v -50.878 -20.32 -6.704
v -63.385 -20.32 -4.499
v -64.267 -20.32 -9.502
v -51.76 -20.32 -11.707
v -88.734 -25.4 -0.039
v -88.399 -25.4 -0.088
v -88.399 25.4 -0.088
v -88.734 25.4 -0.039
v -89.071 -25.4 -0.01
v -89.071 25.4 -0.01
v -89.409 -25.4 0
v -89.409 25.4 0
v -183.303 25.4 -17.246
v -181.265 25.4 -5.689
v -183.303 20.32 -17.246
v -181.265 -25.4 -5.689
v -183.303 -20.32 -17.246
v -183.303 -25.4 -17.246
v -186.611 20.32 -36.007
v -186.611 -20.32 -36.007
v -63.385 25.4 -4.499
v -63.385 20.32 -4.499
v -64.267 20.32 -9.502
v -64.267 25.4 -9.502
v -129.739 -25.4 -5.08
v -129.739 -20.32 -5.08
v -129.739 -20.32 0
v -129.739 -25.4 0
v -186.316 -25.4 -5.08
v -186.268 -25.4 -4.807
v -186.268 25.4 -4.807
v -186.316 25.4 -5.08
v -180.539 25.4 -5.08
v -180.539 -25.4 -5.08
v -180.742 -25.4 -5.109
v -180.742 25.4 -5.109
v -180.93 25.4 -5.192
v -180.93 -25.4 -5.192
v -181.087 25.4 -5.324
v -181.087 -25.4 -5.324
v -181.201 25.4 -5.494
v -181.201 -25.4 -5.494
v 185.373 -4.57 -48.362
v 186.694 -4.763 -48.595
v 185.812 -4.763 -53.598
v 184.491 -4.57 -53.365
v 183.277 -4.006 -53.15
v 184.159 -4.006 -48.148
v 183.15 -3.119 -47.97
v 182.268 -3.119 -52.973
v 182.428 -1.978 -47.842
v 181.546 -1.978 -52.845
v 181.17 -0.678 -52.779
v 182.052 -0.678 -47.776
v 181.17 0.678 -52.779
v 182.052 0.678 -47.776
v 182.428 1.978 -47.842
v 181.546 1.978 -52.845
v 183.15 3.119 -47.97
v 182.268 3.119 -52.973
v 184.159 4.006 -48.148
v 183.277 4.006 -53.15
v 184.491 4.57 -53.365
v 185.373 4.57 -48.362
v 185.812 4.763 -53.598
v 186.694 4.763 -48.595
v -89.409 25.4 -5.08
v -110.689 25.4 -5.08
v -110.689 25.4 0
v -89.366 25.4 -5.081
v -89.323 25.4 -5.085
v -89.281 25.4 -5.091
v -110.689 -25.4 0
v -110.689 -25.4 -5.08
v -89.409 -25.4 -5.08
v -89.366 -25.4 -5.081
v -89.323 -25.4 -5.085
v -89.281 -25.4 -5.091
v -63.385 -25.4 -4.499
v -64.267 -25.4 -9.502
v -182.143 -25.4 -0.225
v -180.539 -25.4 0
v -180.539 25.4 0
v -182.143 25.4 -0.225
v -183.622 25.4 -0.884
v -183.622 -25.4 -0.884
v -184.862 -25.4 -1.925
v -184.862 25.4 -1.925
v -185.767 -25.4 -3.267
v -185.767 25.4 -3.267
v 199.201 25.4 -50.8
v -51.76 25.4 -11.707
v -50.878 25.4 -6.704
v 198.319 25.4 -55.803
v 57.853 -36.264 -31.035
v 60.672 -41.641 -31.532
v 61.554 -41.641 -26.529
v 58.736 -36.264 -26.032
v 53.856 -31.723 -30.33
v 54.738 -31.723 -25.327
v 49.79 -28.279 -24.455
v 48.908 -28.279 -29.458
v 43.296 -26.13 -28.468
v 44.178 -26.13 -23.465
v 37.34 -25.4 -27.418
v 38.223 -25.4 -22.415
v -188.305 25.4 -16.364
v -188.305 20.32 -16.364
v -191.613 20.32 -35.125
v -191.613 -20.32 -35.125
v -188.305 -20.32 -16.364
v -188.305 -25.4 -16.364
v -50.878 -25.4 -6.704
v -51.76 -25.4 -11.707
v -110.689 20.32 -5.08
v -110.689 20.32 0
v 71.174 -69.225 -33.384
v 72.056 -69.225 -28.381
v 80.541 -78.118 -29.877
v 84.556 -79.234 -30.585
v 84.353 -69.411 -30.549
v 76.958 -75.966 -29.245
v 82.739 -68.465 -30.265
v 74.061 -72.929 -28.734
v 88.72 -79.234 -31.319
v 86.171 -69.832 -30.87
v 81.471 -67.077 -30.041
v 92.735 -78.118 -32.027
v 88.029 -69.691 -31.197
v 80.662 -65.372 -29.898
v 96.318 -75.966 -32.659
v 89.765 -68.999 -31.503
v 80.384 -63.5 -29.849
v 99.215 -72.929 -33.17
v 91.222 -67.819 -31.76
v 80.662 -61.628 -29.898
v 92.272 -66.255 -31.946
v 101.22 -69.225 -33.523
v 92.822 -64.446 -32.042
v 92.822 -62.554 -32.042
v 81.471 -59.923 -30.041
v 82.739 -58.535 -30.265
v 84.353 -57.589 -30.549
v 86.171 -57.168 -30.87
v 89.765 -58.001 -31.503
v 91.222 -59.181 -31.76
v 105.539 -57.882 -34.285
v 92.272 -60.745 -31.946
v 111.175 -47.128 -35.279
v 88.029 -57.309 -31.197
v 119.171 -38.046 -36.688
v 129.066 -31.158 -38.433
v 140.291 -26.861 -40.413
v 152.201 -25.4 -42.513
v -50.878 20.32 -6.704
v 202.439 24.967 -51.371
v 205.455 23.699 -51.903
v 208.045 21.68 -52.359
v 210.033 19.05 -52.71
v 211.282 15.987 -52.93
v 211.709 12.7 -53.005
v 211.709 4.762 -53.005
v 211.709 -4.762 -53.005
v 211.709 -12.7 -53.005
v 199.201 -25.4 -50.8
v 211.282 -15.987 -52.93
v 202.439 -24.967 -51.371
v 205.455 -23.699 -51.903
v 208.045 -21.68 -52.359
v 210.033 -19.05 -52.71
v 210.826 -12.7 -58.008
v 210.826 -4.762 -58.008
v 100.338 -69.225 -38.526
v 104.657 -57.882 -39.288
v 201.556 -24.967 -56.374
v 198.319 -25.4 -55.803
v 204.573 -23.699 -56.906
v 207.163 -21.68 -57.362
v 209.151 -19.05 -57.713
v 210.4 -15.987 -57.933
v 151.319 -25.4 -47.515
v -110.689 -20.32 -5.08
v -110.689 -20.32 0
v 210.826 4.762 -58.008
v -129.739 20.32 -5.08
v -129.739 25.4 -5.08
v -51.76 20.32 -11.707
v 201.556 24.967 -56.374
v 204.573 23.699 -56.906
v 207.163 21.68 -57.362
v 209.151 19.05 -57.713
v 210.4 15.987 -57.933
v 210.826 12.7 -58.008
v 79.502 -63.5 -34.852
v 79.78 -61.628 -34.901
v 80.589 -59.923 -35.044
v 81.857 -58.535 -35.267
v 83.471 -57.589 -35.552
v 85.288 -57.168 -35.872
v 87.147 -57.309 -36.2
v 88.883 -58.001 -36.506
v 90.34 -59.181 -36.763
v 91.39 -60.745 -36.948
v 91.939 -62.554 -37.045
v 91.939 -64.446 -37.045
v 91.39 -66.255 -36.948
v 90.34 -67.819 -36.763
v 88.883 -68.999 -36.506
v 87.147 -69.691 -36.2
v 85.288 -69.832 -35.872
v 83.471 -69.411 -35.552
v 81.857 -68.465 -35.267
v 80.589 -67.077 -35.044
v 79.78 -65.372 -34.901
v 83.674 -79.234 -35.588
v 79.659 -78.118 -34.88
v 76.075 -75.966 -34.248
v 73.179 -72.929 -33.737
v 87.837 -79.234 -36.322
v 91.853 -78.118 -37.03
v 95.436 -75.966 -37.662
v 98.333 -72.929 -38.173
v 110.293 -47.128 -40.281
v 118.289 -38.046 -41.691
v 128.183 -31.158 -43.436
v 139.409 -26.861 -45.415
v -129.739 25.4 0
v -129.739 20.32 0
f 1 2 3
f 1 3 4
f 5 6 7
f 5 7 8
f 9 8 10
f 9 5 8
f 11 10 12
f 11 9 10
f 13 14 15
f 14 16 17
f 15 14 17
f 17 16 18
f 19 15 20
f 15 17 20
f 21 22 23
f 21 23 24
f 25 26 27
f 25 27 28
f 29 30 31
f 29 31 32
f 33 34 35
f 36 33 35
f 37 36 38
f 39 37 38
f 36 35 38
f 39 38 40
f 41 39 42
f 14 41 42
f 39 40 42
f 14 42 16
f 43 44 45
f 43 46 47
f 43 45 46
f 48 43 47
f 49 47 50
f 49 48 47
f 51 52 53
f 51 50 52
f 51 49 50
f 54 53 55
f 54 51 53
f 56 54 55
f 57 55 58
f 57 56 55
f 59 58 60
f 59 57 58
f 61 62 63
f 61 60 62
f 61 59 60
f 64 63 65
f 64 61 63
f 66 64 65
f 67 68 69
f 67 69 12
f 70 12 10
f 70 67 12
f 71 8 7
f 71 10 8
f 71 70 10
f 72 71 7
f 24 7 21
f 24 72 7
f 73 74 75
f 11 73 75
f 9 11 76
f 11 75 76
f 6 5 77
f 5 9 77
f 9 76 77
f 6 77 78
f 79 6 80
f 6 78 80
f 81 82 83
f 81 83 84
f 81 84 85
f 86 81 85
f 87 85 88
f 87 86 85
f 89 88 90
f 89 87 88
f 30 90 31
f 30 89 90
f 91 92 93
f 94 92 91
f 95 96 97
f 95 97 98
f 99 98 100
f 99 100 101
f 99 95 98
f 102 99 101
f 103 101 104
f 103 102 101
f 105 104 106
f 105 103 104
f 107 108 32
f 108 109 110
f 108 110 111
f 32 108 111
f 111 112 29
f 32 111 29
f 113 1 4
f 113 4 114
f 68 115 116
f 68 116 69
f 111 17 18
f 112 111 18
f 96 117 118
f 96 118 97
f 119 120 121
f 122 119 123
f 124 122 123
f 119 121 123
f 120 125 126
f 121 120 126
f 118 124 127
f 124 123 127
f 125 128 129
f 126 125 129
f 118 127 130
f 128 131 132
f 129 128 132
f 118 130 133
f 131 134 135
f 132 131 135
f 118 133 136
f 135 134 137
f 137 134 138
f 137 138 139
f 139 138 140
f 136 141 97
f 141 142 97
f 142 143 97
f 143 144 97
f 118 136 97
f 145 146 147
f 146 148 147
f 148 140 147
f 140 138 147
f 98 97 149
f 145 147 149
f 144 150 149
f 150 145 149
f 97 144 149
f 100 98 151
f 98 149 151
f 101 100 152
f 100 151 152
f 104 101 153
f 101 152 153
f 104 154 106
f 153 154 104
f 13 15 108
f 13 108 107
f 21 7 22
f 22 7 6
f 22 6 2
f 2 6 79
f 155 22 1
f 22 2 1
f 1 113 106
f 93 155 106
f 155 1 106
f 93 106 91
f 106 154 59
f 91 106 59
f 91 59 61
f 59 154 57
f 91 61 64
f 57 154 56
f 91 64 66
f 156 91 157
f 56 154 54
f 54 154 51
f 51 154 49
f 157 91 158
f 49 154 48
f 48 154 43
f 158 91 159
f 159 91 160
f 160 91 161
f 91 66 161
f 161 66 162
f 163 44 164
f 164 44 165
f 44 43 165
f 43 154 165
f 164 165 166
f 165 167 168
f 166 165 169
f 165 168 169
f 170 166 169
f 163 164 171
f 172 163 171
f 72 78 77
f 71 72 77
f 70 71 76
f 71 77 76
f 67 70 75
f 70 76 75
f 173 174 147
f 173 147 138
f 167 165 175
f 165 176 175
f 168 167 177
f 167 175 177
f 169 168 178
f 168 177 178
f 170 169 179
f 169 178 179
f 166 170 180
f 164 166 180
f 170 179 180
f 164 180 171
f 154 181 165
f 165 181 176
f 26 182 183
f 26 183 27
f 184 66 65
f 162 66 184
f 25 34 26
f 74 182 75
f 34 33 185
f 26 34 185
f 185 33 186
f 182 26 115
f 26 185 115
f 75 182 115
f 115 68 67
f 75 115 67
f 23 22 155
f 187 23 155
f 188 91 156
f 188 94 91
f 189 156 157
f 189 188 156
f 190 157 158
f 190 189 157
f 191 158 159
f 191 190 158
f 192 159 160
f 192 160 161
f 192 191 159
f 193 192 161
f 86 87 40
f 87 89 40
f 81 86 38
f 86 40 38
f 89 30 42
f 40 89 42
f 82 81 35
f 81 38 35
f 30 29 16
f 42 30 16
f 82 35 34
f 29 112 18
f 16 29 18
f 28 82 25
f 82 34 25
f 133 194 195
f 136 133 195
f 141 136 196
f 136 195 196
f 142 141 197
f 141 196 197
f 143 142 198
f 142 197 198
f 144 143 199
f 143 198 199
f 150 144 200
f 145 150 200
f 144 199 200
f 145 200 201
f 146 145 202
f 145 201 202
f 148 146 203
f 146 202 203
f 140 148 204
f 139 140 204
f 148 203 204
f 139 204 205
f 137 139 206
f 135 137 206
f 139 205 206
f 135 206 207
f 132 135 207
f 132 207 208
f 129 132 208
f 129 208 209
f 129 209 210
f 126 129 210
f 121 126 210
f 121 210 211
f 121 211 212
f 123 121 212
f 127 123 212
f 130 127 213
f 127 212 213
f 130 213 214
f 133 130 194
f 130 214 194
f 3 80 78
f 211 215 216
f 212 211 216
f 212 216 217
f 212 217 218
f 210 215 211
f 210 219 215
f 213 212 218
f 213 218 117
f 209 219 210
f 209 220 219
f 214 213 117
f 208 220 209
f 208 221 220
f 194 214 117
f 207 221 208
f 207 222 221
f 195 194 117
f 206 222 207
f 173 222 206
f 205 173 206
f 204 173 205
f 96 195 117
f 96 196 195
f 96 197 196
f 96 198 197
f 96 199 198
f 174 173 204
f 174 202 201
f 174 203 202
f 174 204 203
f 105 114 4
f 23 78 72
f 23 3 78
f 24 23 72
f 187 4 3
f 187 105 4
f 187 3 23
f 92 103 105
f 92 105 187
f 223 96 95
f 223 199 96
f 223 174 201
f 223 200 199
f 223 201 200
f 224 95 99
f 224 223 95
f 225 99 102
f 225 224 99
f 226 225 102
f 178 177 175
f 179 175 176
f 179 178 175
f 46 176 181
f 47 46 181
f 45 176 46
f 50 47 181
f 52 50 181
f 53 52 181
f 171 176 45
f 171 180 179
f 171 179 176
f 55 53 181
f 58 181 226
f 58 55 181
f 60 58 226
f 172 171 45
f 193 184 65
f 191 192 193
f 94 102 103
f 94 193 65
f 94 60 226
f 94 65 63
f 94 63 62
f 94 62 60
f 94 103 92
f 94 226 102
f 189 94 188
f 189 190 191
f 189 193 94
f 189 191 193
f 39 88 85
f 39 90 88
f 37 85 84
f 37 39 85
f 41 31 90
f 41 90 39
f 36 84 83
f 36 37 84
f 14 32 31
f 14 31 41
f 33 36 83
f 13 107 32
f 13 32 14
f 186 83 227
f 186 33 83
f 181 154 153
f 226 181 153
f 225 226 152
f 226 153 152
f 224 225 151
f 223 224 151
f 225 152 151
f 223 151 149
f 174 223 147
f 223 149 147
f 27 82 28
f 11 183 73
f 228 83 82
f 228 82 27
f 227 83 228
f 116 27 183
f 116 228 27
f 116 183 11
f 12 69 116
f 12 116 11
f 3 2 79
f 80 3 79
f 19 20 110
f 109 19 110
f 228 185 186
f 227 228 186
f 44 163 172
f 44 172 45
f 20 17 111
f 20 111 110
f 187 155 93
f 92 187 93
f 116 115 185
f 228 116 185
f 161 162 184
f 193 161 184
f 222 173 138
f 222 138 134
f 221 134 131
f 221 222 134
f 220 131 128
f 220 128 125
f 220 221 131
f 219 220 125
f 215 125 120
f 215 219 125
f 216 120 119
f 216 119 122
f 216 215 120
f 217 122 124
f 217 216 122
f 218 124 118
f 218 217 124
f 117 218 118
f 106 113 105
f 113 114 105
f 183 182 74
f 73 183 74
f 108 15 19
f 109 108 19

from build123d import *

# Parameters (mm, degrees)
SKETCH1_W               = 431.8
SKETCH1_H               = 50.8
BASE_FLANGE1_DEPTH      = 5.08
SKETCHED_START          = -25.4
SKETCHED_BEND1_DEPTH    = 50.8
SKETCHED_BEND1_2_DEPTH  = 50.8
SKETCHED_BEND2_DEPTH    = 50.8
SKETCHED_BEND2_2_DEPTH  = 50.8
SKETCH9_W               = 19.05
SKETCH9_H               = 5.08
CUT_EXTRUDE1_DEPTH      = 220.697648588
SKETCH10_W              = 19.05
SKETCH10_H              = 5.08
CUT_EXTRUDE2_DEPTH      = 398.423928706
SKETCH11_W              = 12.7
SKETCH11_H              = 5.08
CUT_EXTRUDE3_DEPTH      = 221.091320007
FILLET1_R               = 12.7
CUT_EXTRUDE4_DEPTH      = 221.036222152
CUT_EXTRUDE4_DEPTH_BACK = 221.036222152
SKETCH12_R              = 4.7625
SKETCH14_R              = 6.35
BOSS_EXTRUDE1_DEPTH     = 5.08
FILLET2_R               = 50.8
FILLET3_R               = 25.4


# Read off the part's stored shape, not the designer's step: Sketched Bend1, Sketched Bend2
# Sheet-metal steps are written as plain solids
with BuildPart() as part:
    # Sketch1 → Base-Flange1 (new body)
    with BuildSketch(Plane.XY):
        Rectangle(SKETCH1_W, SKETCH1_H)
    extrude(amount=-BASE_FLANGE1_DEPTH)

    # Sketched Bend1 outline → Sketched Bend1 (cut)
    with BuildSketch(Plane(origin=(0, 0, 0), x_dir=(1, 0, 0), z_dir=(0, 1, 0)).offset(SKETCHED_START)):
        with BuildLine():
            Line((-186.267525861, 4.80655801), (-186.315741061, 5.08))
            Line((-186.315741061, 5.08), (-215.9, 5.08))
            Line((-215.9, 5.08), (-215.9, 0))
            Line((-215.9, 0), (-180.539293085, 0))
            ThreePointArc((-180.539293085, 0), (-184.278131496, 1.360825892), (-186.267525861, 4.80655801))
        make_face()
    extrude(amount=SKETCHED_BEND1_DEPTH, mode=Mode.SUBTRACT)

    # Sketched Bend1 2 outline → Sketched Bend1 2 (add)
    with BuildSketch(Plane(origin=(0, 0, 0), x_dir=(1, 0, 0), z_dir=(0, 1, 0)).offset(SKETCHED_START)):
        with BuildLine():
            Line((-181.264702476, 5.688690752), (-186.61058496, 36.006696892))
            Line((-186.61058496, 36.006696892), (-191.613408345, 35.124564149))
            Line((-191.613408345, 35.124564149), (-186.315741061, 5.08))
            Line((-186.315741061, 5.08), (-180.539293085, 5.08))
            ThreePointArc((-180.539293085, 5.08), (-181.012770439, 5.252331663), (-181.264702476, 5.688690752))
        make_face()
    extrude(amount=SKETCHED_BEND1_2_DEPTH)

    # Sketched Bend2 outline → Sketched Bend2 (cut)
    with BuildSketch(Plane(origin=(0, 0, 0), x_dir=(1, 0, 0), z_dir=(0, 1, 0)).offset(SKETCHED_START)):
        with BuildLine():
            Line((215.9, 5.08), (-60.089888357, 5.08))
            Line((-60.089888357, 5.08), (-88.39884457, 0.088367224))
            ThreePointArc((-88.39884457, 0.088367224), (-88.901936467, 0.022133919), (-89.40888656, 0))
            Line((-89.40888656, 0), (215.9, 0))
            Line((215.9, 0), (215.9, 5.08))
        make_face()
    extrude(amount=SKETCHED_BEND2_DEPTH, mode=Mode.SUBTRACT)

    # Sketched Bend2 2 outline → Sketched Bend2 2 (add)
    with BuildSketch(Plane(origin=(0, 0, 0), x_dir=(1, 0, 0), z_dir=(0, 1, 0)).offset(SKETCHED_START)):
        with BuildLine():
            Line((210.826394713, 58.008217407), (-89.280977313, 5.091190609))
            ThreePointArc((-89.280977313, 5.091190609), (-89.34468764, 5.082802985), (-89.40888656, 5.08))
            Line((-89.40888656, 5.08), (-60.089888357, 5.08))
            Line((-60.089888357, 5.08), (211.708527455, 53.005394021))
            Line((211.708527455, 53.005394021), (210.826394713, 58.008217407))
        make_face()
    extrude(amount=SKETCHED_BEND2_2_DEPTH)

    # Sketch9 → Cut-Extrude1 (cut, through all)
    with BuildSketch(Plane(origin=(0, 0, -5.08), x_dir=(-1, 0, 0), z_dir=(0, 0, -1))):
        with Locations((120.214293085, 22.86)):
            Rectangle(SKETCH9_W, SKETCH9_H)
    cut_extrude1 = extrude(amount=-CUT_EXTRUDE1_DEPTH, mode=Mode.SUBTRACT)

    # Sketch10 → Cut-Extrude2 (cut, through all)
    with BuildSketch(Plane(origin=(-174.826079488, 0, 30.826554745), x_dir=(-0.17364817766692736, 0, -0.9848077530122086), z_dir=(0.9848077530122086, 0, -0.17364817766692736))):
        with Locations((58.339262271, 22.86)):
            Rectangle(SKETCH10_W, SKETCH10_H)
    cut_extrude2 = extrude(amount=-CUT_EXTRUDE2_DEPTH, mode=Mode.SUBTRACT)

    # Sketch11 → Cut-Extrude3 (cut, through all)
    with BuildSketch(Plane(origin=(-2.680663006, 0, -15.202795371), x_dir=(0.9848077530122081, 0, -0.17364817766693072), z_dir=(0.17364817766693072, 0, 0.9848077530122081))):
        with Locations((-55.290522683, 22.86)):
            Rectangle(SKETCH11_W, SKETCH11_H)
    cut_extrude3 = extrude(amount=-CUT_EXTRUDE3_DEPTH, mode=Mode.SUBTRACT)

    # Mirror1: Cut-Extrude1, Cut-Extrude2, Cut-Extrude3 across plane
    add(cut_extrude1.mirror(Plane.ZX), mode=Mode.SUBTRACT)
    add(cut_extrude2.mirror(Plane.ZX), mode=Mode.SUBTRACT)
    add(cut_extrude3.mirror(Plane.ZX), mode=Mode.SUBTRACT)

    # Fillet1
    fillet1_edges = [part.edges().sort_by_distance(p)[0] for p in [
        (211.267461084, 25.4, -55.506805714),
        (211.267461084, -25.4, -55.506805714),
    ]]
    fillet(fillet1_edges, radius=FILLET1_R)

    # Sketch12 → Cut-Extrude4 (cut, two sides: drawn at the far end of the back side and taken through both)
    with BuildSketch(Plane(origin=(-3.562795749, 0, -20.205618756), x_dir=(-0.9848077530122081, 0, 0.17364817766693072), z_dir=(-0.17364817766693072, 0, -0.9848077530122081)).offset(-CUT_EXTRUDE4_DEPTH_BACK)):
        with BuildLine():
            ThreePointArc((-192.296489295, -4.7625), (-197.058989295, 0), (-192.296489295, 4.7625))
            Line((-192.296489295, 4.7625), (-217.696489295, 4.7625))
            Line((-217.696489295, 4.7625), (-217.696489295, -4.7625))
            Line((-217.696489295, -4.7625), (-192.296489295, -4.7625))
        make_face()
        with Locations((-192.296489295, 0)):
            Circle(SKETCH12_R)
    extrude(amount=CUT_EXTRUDE4_DEPTH + CUT_EXTRUDE4_DEPTH_BACK, mode=Mode.SUBTRACT)

    # Sketch14 → Boss-Extrude1 (add)
    with BuildSketch(Plane(origin=(-3.562795749, 0, -20.205618756), x_dir=(-0.9848077530122081, 0, 0.17364817766693072), z_dir=(-0.17364817766693072, 0, -0.9848077530122081))):
        with BuildLine():
            Line((-75.889552591, -69.224530587), (-58.946489295, -25.4))
            Line((-58.946489295, -25.4), (-122.446489295, -25.4))
            Line((-122.446489295, -25.4), (-105.503425999, -69.224530587))
            ThreePointArc((-105.503425999, -69.224530587), (-90.696489295, -79.375), (-75.889552591, -69.224530587))
        make_face()
        with Locations((-90.696489295, -63.5)):
            Circle(SKETCH14_R, mode=Mode.SUBTRACT)
    extrude(amount=-BOSS_EXTRUDE1_DEPTH)

    # Fillet2
    fillet2_edges = [part.edges().sort_by_distance(p)[0] for p in [
        (117.46452261, -25.4, -38.966816791),
    ]]
    fillet(fillet2_edges, radius=FILLET2_R)

    # Fillet3
    # the kernel refuses this fillet: 25.4 mm, written as the material it adds along each edge
    with BuildSketch(Plane(origin=(54.488163922, -25.4, -30.441569202), x_dir=(0.35512202231381235, -0.9327204223089547, -0.06261759397767878), z_dir=(0.17364817766693072, 0, 0.9848077530122081))) as fillet3_piece_1:
        with BuildLine():
            CenterArc((FILLET3_R * 0.685521226707, -FILLET3_R), FILLET3_R, 90, 68.862929738)
            Line((-FILLET3_R * 0.247199195602, -FILLET3_R * 0.639399648076), (0, 0))
            Line((0, 0), (FILLET3_R * 0.685521226707, 0))
        make_face()
    extrude(amount=5.08)


solid = part.part
